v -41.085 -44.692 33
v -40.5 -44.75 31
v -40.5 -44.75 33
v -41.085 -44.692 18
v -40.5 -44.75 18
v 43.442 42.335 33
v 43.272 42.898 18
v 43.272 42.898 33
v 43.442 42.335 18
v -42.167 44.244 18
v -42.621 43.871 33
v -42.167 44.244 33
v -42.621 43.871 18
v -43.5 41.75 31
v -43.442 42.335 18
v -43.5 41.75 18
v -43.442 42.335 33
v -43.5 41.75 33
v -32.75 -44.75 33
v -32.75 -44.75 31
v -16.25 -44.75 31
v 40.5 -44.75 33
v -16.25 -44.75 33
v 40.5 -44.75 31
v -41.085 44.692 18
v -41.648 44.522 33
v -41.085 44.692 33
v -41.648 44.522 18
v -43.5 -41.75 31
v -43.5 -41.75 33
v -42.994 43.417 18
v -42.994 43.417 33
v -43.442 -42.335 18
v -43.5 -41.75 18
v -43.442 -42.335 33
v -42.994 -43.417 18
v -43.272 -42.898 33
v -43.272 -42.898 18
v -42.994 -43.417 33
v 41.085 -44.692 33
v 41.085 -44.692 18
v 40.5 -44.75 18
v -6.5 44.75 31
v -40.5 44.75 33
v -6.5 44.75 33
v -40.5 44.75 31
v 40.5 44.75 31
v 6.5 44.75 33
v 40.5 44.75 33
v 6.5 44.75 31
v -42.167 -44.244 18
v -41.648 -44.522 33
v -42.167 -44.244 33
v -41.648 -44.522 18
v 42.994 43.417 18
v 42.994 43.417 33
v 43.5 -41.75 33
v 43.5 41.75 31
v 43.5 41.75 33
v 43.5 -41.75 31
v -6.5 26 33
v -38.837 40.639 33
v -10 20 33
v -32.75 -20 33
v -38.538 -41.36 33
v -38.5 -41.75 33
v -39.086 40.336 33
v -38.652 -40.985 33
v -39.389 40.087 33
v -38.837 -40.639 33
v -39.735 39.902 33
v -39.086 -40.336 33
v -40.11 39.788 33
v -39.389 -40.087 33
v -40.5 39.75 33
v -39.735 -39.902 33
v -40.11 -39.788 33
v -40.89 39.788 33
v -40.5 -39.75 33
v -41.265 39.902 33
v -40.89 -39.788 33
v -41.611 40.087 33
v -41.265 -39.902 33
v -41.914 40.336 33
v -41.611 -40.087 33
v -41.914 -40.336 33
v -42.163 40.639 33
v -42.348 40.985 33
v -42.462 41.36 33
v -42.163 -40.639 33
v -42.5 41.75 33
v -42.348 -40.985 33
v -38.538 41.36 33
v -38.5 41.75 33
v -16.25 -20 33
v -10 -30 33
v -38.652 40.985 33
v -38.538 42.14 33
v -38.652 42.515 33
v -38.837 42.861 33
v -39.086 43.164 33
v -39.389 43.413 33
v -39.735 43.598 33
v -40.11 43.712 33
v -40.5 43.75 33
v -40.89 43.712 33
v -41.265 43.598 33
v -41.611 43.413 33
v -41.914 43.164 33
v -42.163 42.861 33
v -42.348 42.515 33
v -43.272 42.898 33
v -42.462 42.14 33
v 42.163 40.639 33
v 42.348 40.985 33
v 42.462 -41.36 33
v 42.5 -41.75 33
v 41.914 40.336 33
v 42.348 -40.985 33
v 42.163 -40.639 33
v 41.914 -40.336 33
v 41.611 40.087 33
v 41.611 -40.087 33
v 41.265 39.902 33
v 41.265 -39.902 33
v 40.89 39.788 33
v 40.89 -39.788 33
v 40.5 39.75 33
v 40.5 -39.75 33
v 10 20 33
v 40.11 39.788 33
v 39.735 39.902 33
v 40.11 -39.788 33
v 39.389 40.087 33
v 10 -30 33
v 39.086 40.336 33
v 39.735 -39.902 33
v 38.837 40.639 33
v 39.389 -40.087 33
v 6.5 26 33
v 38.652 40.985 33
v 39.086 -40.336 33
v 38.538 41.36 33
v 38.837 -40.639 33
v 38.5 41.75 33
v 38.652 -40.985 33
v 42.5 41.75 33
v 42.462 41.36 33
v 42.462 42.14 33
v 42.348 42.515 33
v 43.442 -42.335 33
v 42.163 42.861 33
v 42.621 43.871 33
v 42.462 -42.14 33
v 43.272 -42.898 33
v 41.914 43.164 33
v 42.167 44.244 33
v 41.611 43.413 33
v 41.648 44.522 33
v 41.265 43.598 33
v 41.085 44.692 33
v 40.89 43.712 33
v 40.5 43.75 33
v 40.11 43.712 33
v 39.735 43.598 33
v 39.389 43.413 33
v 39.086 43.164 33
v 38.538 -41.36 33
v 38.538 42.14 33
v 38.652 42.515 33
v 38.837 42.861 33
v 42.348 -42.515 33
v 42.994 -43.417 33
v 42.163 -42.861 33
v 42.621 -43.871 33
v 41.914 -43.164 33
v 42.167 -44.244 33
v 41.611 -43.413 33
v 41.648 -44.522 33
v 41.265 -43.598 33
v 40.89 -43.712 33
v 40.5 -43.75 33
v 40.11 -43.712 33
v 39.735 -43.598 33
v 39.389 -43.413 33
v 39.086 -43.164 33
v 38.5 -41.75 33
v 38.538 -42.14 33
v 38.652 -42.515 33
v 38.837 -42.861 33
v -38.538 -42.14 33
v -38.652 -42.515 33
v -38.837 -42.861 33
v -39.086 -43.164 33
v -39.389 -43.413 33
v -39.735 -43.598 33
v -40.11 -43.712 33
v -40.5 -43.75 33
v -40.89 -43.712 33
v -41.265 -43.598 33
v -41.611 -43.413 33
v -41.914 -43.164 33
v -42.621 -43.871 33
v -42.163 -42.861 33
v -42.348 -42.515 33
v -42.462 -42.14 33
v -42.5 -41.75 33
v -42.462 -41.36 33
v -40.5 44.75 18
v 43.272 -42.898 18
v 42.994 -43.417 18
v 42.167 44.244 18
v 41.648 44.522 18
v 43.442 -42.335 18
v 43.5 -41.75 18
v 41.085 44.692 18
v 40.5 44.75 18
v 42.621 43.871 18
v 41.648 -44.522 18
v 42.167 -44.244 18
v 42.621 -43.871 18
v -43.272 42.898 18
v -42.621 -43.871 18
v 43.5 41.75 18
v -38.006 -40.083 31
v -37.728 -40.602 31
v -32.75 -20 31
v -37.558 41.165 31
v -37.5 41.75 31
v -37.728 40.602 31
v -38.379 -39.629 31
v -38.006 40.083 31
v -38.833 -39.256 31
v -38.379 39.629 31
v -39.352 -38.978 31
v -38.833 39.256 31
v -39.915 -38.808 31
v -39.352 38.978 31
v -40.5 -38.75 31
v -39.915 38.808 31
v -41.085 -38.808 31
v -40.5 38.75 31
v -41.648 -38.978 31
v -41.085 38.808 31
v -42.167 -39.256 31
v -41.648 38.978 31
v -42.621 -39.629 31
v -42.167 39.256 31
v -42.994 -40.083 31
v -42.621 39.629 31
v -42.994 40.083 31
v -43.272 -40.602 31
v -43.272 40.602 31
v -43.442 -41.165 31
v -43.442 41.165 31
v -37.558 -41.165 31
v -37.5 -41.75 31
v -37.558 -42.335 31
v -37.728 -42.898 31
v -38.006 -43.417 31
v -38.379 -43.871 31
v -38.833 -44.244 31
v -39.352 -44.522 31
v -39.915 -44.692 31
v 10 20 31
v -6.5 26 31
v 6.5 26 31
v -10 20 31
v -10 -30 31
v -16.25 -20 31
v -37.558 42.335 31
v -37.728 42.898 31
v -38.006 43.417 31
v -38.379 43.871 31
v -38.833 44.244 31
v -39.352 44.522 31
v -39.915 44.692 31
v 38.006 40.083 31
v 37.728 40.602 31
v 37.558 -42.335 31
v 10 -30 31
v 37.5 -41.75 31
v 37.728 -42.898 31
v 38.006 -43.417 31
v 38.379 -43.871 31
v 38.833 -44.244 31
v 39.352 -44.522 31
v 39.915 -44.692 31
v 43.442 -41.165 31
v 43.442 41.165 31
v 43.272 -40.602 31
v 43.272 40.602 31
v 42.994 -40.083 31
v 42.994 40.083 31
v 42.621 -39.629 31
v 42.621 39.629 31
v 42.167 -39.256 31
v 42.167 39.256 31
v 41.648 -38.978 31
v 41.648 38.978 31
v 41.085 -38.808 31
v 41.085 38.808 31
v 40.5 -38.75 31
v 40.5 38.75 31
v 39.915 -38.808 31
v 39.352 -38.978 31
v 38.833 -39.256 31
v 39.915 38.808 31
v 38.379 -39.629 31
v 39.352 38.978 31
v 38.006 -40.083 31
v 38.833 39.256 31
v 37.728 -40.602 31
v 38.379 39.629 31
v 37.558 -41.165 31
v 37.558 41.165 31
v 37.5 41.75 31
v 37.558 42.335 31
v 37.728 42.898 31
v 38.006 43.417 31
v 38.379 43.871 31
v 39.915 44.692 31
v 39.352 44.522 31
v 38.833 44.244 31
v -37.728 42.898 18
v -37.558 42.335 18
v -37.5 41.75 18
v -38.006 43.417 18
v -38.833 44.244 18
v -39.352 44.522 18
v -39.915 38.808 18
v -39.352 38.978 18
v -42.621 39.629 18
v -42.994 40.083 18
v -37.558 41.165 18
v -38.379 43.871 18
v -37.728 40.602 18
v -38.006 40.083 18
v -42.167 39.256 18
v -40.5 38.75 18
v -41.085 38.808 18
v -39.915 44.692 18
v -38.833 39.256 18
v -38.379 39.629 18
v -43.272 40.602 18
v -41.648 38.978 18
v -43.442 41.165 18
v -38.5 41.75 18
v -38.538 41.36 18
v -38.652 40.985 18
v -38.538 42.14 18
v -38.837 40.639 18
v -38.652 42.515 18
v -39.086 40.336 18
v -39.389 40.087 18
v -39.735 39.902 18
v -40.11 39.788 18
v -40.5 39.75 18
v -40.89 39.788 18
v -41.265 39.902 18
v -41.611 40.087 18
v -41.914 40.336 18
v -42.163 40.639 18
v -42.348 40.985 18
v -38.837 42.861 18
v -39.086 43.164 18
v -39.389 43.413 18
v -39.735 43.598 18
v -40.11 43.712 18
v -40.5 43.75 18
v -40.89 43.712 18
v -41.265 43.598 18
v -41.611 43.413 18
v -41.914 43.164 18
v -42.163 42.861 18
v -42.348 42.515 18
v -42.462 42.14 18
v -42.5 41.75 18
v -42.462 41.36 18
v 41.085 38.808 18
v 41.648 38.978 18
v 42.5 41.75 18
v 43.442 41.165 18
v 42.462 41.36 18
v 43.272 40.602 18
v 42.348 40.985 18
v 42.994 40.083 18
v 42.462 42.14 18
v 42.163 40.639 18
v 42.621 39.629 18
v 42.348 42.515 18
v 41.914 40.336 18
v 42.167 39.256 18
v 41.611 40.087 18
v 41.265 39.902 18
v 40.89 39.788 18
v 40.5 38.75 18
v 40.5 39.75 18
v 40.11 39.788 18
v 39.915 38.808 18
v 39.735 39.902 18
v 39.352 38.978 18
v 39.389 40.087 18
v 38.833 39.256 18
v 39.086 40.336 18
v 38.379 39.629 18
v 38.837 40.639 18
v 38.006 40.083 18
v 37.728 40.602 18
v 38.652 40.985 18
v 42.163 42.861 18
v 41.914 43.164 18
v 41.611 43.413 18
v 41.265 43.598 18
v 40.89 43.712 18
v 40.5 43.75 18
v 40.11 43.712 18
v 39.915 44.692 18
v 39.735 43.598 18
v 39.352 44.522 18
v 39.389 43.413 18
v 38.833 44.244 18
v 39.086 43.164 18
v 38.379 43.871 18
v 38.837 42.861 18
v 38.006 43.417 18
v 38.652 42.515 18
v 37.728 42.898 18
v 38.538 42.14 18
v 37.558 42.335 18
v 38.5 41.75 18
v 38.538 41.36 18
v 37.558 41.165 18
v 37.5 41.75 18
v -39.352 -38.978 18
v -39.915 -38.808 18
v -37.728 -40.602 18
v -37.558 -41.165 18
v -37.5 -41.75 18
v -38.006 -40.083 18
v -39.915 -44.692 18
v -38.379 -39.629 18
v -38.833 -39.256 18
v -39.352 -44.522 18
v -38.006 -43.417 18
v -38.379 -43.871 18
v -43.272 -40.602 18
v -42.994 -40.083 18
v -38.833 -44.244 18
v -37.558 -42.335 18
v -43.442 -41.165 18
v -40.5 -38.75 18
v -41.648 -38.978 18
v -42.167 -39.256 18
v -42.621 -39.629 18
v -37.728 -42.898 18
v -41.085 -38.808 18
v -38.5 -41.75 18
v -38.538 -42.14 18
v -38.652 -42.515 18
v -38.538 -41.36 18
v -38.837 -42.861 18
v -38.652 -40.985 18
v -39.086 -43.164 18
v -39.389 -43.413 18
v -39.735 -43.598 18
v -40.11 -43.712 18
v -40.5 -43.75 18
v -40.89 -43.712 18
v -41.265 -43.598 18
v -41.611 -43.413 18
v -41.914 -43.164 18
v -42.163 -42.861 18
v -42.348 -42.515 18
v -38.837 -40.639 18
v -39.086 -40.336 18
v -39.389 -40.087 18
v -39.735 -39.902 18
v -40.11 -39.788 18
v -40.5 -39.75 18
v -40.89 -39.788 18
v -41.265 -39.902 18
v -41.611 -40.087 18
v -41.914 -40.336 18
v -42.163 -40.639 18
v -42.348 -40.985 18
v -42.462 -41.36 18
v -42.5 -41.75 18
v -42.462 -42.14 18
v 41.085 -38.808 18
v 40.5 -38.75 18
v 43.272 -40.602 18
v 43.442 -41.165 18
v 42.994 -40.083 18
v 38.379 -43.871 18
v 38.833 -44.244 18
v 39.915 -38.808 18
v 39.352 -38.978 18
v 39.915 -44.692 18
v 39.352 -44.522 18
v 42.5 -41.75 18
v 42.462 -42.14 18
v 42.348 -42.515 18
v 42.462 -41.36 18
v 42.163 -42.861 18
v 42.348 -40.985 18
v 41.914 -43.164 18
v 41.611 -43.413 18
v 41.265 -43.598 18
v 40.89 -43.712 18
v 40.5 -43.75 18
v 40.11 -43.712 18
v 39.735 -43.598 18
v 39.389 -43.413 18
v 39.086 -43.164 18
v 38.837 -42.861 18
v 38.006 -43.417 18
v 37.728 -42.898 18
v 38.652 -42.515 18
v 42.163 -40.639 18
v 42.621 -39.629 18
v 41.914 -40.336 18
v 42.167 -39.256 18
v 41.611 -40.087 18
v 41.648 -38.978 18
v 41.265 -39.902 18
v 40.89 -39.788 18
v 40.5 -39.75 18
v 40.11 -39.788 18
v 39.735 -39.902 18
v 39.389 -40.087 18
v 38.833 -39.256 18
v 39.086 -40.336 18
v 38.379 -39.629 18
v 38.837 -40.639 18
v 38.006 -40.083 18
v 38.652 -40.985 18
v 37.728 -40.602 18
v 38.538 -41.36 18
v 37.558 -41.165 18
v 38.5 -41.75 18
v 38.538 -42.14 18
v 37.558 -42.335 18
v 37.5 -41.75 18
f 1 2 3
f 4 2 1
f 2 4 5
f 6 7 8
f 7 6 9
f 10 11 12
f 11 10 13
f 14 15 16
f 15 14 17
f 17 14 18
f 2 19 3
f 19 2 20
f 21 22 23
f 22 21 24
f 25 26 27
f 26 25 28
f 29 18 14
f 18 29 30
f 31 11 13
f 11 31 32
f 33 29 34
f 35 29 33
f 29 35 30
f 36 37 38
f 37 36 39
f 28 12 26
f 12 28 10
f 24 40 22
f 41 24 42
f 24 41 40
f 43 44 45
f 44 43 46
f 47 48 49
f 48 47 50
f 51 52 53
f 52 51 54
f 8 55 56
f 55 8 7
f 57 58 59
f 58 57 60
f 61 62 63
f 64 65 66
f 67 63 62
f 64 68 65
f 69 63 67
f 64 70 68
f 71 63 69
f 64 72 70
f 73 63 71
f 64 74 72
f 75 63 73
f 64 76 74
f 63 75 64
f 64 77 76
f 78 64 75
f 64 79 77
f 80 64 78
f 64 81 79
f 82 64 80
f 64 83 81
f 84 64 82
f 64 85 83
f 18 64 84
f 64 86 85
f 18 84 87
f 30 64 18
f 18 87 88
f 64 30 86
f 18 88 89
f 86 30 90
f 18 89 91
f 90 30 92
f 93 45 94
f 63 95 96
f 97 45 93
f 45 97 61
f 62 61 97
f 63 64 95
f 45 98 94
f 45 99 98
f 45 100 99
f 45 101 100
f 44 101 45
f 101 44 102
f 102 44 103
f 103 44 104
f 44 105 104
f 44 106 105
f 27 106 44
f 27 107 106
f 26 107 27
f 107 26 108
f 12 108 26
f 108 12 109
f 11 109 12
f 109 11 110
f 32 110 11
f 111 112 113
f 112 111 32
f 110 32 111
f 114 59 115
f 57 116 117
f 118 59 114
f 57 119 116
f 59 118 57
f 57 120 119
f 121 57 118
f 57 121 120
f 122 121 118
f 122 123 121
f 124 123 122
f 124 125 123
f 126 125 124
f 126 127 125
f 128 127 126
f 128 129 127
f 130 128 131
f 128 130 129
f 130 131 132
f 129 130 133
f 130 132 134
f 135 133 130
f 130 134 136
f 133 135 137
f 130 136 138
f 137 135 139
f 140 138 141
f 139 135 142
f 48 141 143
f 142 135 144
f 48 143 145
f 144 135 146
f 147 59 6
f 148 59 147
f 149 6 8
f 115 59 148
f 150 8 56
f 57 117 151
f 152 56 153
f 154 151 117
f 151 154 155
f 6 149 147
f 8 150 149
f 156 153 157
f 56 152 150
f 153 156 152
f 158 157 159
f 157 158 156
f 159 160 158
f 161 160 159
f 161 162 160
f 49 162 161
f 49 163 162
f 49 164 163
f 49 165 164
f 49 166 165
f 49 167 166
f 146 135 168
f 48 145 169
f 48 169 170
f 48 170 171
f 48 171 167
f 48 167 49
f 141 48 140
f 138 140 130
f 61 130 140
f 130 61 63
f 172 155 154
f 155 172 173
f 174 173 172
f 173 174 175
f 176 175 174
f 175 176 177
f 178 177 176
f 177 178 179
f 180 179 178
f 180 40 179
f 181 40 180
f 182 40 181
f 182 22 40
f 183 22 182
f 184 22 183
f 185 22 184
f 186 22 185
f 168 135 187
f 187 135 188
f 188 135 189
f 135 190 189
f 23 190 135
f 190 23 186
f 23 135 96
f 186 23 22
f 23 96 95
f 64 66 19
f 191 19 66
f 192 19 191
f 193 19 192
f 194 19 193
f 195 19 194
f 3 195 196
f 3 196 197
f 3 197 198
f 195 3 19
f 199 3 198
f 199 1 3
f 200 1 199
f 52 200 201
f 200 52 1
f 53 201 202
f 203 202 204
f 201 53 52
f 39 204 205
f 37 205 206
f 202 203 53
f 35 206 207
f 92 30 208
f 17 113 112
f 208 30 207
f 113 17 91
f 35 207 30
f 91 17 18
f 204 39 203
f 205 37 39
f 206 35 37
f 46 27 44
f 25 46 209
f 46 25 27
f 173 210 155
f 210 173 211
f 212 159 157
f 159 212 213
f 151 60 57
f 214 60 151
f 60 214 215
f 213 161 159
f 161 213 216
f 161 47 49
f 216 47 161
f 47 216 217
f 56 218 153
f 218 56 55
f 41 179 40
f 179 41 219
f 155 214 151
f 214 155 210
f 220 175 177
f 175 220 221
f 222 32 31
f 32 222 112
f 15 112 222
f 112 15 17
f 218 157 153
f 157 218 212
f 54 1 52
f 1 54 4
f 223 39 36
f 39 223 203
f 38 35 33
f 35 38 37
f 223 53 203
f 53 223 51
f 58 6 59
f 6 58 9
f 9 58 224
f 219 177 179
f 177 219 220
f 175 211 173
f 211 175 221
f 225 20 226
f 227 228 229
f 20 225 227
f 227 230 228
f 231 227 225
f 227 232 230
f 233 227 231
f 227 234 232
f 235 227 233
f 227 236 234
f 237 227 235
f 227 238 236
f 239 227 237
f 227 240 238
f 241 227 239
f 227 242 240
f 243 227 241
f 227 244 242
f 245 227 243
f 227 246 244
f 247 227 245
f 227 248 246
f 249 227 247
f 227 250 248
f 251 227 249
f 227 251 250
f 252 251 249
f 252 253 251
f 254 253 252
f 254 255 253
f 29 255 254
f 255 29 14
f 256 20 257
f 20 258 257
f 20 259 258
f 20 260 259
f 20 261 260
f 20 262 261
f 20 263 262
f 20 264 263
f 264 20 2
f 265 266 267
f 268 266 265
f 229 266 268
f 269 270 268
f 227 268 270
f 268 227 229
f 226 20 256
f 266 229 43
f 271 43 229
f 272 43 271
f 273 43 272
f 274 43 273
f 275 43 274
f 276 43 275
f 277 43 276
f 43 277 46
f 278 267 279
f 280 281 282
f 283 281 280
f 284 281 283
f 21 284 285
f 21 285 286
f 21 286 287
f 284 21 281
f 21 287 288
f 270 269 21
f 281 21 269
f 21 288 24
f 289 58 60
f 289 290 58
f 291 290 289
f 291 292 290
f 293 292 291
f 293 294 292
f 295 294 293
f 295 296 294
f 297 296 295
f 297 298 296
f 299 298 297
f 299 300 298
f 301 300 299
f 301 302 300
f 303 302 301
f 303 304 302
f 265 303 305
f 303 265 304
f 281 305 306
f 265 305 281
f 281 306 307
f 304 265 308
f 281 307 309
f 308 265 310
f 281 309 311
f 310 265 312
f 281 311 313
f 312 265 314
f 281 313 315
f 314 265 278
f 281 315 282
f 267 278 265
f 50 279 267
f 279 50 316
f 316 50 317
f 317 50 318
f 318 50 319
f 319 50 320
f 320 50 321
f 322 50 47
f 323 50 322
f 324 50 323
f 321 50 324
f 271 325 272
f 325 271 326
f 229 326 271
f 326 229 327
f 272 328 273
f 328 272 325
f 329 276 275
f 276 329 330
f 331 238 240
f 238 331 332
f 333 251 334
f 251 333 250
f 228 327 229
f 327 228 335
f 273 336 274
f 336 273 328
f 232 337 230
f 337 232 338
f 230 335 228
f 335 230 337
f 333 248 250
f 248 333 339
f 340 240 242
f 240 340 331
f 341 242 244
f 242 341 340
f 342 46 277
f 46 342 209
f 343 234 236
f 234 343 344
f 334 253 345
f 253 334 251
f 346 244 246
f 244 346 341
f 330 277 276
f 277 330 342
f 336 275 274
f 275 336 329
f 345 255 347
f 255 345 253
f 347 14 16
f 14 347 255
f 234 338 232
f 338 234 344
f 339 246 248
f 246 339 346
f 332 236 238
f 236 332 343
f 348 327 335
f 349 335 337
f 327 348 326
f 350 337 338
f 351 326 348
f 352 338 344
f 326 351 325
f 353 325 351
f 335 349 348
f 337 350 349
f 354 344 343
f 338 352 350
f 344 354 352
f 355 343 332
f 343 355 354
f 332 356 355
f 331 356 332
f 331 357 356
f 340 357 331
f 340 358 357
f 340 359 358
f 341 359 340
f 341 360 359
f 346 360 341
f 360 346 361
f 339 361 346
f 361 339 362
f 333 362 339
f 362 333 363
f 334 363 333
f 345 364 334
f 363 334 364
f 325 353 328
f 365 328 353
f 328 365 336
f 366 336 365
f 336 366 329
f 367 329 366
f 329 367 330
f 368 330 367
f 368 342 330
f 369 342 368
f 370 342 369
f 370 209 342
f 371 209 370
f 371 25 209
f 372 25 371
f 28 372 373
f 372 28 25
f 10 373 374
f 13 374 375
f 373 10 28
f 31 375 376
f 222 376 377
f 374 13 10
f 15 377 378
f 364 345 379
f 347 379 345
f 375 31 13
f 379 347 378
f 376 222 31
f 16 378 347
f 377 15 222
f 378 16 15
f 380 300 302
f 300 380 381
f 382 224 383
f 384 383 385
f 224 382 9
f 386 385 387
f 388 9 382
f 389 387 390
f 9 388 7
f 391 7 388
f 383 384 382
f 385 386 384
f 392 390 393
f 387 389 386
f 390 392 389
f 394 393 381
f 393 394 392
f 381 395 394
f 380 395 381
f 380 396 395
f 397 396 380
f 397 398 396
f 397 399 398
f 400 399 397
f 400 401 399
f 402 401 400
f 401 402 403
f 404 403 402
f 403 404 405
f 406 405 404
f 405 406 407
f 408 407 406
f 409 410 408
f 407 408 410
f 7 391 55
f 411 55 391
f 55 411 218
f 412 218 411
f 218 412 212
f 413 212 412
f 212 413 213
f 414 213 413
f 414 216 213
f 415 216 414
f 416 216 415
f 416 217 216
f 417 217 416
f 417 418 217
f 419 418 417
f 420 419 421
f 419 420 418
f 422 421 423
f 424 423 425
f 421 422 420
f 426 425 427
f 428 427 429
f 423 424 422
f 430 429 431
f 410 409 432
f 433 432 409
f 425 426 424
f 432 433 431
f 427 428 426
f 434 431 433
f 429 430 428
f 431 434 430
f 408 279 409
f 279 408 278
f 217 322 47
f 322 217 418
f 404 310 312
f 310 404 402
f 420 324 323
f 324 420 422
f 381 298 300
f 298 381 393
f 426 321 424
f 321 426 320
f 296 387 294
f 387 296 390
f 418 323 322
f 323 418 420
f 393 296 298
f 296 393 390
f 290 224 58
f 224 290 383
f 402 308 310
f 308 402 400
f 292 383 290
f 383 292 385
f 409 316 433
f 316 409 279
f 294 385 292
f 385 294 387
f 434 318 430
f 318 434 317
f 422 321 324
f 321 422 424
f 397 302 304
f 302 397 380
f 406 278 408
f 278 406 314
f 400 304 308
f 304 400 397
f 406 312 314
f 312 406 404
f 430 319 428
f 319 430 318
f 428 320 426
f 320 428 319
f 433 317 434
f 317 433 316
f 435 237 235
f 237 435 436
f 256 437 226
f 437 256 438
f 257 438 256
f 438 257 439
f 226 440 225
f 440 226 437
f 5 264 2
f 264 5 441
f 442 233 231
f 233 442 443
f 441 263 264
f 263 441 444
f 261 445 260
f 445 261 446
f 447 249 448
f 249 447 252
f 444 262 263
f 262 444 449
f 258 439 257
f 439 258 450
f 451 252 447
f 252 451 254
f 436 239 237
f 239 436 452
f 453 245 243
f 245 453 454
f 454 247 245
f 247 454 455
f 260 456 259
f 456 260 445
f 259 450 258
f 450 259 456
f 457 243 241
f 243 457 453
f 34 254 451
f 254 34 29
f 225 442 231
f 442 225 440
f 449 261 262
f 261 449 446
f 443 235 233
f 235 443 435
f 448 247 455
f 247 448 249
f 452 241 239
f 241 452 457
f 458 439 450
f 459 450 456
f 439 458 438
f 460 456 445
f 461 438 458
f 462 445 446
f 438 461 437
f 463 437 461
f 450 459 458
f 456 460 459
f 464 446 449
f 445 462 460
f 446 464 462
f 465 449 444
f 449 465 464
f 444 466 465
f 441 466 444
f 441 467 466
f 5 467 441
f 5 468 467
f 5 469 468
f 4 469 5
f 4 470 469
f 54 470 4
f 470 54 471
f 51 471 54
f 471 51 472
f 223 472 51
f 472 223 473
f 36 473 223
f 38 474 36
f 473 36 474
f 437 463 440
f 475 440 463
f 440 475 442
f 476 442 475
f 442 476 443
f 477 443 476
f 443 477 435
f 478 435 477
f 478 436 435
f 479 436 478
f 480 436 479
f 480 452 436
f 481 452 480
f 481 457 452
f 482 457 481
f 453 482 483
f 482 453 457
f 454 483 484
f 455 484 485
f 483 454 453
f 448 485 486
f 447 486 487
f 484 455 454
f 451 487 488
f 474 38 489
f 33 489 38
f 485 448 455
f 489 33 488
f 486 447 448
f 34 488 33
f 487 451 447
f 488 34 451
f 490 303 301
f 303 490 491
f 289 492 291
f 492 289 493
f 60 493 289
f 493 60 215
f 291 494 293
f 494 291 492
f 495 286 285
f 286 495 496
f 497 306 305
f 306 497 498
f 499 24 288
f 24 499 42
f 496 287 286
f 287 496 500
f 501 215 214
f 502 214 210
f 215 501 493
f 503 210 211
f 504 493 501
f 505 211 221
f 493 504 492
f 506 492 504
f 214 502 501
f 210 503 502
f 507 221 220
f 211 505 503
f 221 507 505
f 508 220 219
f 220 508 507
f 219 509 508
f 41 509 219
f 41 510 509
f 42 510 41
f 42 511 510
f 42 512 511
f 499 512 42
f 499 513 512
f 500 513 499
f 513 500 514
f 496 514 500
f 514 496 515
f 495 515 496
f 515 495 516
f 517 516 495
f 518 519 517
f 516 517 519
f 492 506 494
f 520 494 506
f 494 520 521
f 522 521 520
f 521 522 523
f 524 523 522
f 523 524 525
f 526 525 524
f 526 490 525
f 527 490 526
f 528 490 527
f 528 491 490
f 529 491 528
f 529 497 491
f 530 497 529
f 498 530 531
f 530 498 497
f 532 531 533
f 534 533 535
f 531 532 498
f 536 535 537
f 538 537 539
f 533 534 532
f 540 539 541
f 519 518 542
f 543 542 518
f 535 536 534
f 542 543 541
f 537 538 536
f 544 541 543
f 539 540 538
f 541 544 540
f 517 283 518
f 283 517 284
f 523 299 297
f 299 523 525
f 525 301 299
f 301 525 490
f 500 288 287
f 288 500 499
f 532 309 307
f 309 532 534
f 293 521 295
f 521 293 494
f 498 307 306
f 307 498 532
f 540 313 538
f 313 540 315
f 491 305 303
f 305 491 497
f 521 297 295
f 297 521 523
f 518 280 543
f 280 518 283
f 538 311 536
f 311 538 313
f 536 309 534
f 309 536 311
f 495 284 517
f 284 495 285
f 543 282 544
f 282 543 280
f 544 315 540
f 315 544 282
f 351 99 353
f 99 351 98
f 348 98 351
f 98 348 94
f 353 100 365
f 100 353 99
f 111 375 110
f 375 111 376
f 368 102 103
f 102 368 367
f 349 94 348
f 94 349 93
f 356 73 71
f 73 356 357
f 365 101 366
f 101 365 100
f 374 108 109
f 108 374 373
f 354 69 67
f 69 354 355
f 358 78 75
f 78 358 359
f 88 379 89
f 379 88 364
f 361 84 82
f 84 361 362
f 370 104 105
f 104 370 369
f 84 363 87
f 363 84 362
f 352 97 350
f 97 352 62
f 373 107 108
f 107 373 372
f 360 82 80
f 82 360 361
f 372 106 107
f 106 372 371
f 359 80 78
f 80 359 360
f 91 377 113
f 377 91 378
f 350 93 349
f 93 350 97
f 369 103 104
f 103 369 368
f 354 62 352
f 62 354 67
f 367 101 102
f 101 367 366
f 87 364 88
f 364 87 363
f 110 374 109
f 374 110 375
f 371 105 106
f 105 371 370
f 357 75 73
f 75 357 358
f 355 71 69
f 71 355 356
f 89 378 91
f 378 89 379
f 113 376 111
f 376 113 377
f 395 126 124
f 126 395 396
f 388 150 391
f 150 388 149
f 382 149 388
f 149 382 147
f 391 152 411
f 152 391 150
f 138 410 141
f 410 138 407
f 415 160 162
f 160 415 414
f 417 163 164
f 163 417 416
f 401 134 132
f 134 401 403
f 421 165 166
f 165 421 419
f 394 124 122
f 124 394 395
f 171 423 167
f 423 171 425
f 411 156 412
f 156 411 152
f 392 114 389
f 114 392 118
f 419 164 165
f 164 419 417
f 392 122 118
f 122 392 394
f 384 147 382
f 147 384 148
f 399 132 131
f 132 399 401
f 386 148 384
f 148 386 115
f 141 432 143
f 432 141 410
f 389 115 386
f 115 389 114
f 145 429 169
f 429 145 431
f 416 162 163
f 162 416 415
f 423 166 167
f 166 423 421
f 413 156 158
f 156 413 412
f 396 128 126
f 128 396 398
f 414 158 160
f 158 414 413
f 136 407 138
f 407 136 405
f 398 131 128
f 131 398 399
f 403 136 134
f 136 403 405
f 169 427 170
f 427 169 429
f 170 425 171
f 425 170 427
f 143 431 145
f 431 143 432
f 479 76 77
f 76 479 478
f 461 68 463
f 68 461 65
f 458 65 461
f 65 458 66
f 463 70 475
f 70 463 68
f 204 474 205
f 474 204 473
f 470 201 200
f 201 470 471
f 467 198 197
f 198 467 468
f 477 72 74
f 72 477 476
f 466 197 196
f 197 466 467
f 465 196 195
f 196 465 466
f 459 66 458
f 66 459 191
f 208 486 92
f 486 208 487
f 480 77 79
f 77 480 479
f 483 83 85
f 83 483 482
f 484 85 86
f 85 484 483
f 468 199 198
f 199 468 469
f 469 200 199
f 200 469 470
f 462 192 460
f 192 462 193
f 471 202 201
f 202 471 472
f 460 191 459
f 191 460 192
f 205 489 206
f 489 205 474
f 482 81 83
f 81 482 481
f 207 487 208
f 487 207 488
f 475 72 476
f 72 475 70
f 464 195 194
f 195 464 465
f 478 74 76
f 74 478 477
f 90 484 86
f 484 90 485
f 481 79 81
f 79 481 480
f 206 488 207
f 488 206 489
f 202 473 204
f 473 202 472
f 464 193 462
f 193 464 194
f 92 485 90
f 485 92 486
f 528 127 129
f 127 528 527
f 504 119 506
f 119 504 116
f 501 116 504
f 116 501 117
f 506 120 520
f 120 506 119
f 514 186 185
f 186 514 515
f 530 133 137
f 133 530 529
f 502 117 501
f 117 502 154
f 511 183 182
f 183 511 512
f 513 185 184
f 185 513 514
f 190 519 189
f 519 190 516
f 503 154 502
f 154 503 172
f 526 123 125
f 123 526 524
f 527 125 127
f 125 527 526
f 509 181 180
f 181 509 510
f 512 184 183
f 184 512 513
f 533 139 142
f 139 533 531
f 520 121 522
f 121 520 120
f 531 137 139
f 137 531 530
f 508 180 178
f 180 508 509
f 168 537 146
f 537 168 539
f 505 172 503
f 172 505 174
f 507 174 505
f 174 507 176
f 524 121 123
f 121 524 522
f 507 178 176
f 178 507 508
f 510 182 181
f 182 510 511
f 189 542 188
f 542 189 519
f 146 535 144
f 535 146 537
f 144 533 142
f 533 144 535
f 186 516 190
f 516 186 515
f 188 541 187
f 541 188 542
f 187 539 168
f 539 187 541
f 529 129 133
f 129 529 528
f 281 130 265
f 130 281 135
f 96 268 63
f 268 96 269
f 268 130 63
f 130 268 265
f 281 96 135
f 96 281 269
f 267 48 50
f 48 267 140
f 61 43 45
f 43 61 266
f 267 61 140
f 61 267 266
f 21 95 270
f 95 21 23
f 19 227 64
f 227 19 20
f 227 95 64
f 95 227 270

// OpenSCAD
$fn=32;

/*


hull() {
        translate([-(54.4 + 81)/2, 0, 0]) {
            translate([-54.4/2, 83.5/2, 0]) {
                cylinder(d=6, h=2);
            }
        }
        translate([(54.4 + 81)/2, 0, 0]) {
            translate([54.4/2, 83.5/2, 0]) {
                cylinder(d=6, h=2);
            }
        }
}
hull() {
        translate([-(54.4 + 81)/2, 0, 0]) {
            translate([-54.4/2, -83.5/2, 0]) {
                cylinder(d=6, h=2);
            }
        }
        translate([(54.4 + 81)/2, 0, 0]) {
            translate([54.4/2, -83.5/2, 0]) {
                cylinder(d=6, h=2);
            }
        }
}

hull() {
        translate([-(54.4 + 81)/2, 0, 0]) {
            translate([-54.4/2, -83.5/2, 0]) {
                cylinder(d=6, h=2);
            }
            translate([-54.4/2, 83.5/2, 0]) {
                cylinder(d=6, h=2);
            }
        }
}
hull() {
        translate([(54.4 + 81)/2, 0, 0]) {
            translate([54.4/2, 83.5/2, 0]) {
                cylinder(d=6, h=2);
            }
            translate([54.4/2, -83.5/2, 0]) {
                cylinder(d=6, h=2);
            }
        }
}


translate([-(54.4 + 81)/2, 0, 0]) {
    difference() {
        union() {
            translate([54.4/2, 83.5/2, 0]) {
                cylinder(d=6, h=15);
            }
            translate([-54.4/2, 83.5/2, 0]) {
                cylinder(d=6, h=15);
            }
            translate([54.4/2, -83.5/2, 0]) {
                cylinder(d=6, h=15);
            }
            translate([-54.4/2, -83.5/2, 0]) {
                cylinder(d=6, h=15);
            }
        }
        translate([54.4/2, 83.5/2, 0]) {
            cylinder(d=3, h=16);
        }
        translate([-54.4/2, 83.5/2, 0]) {
            cylinder(d=3, h=16);
        }
        translate([54.4/2, -83.5/2, 0]) {
            cylinder(d=3, h=16);
        }
        translate([-54.4/2, -83.5/2, 0]) {
            cylinder(d=3, h=16);
        }
    }
}

translate([(54.4 + 81)/2, 0, 0]) {
    difference() {
        union() {
            translate([54.4/2, 83.5/2, 0]) {
                cylinder(d=6, h=15);
            }
            translate([-54.4/2, 83.5/2, 0]) {
                cylinder(d=6, h=15);
            }
            translate([54.4/2, -83.5/2, 0]) {
                cylinder(d=6, h=15);
            }
            translate([-54.4/2, -83.5/2, 0]) {
                cylinder(d=6, h=15);
            }
        }
        translate([54.4/2, 83.5/2, 0]) {
            cylinder(d=3, h=16);
        }
        translate([-54.4/2, 83.5/2, 0]) {
            cylinder(d=3, h=16);
        }
        translate([54.4/2, -83.5/2, 0]) {
            cylinder(d=3, h=16);
        }
        translate([-54.4/2, -83.5/2, 0]) {
            cylinder(d=3, h=16);
        }
    }
}

*/

translate([0, 0, 18]) {

difference() {
    union() {
        hull() {
            translate([-(54.4 + 81)/2, 0, 13]) {
                translate([54.4/2, 83.5/2, 0]) {
                    cylinder(d=6, h=2);
                }
            }
            translate([(54.4 + 81)/2, 0, 13]) {
                translate([-54.4/2, 83.5/2, 0]) {
                    cylinder(d=6, h=2);
                }
            }
            translate([-(54.4 + 81)/2, 0, 13]) {
                translate([54.4/2, -83.5/2, 0]) {
                    cylinder(d=6, h=2);
                }
            }
            translate([(54.4 + 81)/2, 0, 13]) {
                translate([-54.4/2, -83.5/2, 0]) {
                    cylinder(d=6, h=2);
                }
            }
        }


        translate([-(54.4 + 81)/2, 0, 0]) {
            translate([54.4/2, 83.5/2, 0]) {
                cylinder(d=6, h=14);
            }
        }
        translate([(54.4 + 81)/2, 0, 0]) {
            translate([-54.4/2, 83.5/2, 0]) {
                cylinder(d=6, h=14);
            }
        }
        translate([-(54.4 + 81)/2, 0, 0]) {
            translate([54.4/2, -83.5/2, 0]) {
                cylinder(d=6, h=14);
            }
        }
        translate([(54.4 + 81)/2, 0, 0]) {
            translate([-54.4/2, -83.5/2, 0]) {
                cylinder(d=6, h=14);
            }
        }
    }

        translate([-(54.4 + 81)/2, 0, 0]) {
            translate([54.4/2, 83.5/2, 0]) {
                cylinder(d=4, h=18);
            }
        }
        translate([(54.4 + 81)/2, 0, 0]) {
            translate([-54.4/2, 83.5/2, 0]) {
                cylinder(d=4, h=18);
            }
        }
        translate([-(54.4 + 81)/2, 0, 0]) {
            translate([54.4/2, -83.5/2, 0]) {
                cylinder(d=4, h=18);
            }
        }
        translate([(54.4 + 81)/2, 0, 0]) {
            translate([-54.4/2, -83.5/2, 0]) {
                cylinder(d=4, h=18);
            }
        }

        translate([0, -5, 10]) {
            cube([20, 50, 15], center=true);
        }

        translate([0, 36, 10]) {
            cube([13, 20, 15], center=true);
        }

        translate([-40.5+7.75, -45, 10]) {
            cube([16.5, 25, 15]);
        }

    }


 
}
